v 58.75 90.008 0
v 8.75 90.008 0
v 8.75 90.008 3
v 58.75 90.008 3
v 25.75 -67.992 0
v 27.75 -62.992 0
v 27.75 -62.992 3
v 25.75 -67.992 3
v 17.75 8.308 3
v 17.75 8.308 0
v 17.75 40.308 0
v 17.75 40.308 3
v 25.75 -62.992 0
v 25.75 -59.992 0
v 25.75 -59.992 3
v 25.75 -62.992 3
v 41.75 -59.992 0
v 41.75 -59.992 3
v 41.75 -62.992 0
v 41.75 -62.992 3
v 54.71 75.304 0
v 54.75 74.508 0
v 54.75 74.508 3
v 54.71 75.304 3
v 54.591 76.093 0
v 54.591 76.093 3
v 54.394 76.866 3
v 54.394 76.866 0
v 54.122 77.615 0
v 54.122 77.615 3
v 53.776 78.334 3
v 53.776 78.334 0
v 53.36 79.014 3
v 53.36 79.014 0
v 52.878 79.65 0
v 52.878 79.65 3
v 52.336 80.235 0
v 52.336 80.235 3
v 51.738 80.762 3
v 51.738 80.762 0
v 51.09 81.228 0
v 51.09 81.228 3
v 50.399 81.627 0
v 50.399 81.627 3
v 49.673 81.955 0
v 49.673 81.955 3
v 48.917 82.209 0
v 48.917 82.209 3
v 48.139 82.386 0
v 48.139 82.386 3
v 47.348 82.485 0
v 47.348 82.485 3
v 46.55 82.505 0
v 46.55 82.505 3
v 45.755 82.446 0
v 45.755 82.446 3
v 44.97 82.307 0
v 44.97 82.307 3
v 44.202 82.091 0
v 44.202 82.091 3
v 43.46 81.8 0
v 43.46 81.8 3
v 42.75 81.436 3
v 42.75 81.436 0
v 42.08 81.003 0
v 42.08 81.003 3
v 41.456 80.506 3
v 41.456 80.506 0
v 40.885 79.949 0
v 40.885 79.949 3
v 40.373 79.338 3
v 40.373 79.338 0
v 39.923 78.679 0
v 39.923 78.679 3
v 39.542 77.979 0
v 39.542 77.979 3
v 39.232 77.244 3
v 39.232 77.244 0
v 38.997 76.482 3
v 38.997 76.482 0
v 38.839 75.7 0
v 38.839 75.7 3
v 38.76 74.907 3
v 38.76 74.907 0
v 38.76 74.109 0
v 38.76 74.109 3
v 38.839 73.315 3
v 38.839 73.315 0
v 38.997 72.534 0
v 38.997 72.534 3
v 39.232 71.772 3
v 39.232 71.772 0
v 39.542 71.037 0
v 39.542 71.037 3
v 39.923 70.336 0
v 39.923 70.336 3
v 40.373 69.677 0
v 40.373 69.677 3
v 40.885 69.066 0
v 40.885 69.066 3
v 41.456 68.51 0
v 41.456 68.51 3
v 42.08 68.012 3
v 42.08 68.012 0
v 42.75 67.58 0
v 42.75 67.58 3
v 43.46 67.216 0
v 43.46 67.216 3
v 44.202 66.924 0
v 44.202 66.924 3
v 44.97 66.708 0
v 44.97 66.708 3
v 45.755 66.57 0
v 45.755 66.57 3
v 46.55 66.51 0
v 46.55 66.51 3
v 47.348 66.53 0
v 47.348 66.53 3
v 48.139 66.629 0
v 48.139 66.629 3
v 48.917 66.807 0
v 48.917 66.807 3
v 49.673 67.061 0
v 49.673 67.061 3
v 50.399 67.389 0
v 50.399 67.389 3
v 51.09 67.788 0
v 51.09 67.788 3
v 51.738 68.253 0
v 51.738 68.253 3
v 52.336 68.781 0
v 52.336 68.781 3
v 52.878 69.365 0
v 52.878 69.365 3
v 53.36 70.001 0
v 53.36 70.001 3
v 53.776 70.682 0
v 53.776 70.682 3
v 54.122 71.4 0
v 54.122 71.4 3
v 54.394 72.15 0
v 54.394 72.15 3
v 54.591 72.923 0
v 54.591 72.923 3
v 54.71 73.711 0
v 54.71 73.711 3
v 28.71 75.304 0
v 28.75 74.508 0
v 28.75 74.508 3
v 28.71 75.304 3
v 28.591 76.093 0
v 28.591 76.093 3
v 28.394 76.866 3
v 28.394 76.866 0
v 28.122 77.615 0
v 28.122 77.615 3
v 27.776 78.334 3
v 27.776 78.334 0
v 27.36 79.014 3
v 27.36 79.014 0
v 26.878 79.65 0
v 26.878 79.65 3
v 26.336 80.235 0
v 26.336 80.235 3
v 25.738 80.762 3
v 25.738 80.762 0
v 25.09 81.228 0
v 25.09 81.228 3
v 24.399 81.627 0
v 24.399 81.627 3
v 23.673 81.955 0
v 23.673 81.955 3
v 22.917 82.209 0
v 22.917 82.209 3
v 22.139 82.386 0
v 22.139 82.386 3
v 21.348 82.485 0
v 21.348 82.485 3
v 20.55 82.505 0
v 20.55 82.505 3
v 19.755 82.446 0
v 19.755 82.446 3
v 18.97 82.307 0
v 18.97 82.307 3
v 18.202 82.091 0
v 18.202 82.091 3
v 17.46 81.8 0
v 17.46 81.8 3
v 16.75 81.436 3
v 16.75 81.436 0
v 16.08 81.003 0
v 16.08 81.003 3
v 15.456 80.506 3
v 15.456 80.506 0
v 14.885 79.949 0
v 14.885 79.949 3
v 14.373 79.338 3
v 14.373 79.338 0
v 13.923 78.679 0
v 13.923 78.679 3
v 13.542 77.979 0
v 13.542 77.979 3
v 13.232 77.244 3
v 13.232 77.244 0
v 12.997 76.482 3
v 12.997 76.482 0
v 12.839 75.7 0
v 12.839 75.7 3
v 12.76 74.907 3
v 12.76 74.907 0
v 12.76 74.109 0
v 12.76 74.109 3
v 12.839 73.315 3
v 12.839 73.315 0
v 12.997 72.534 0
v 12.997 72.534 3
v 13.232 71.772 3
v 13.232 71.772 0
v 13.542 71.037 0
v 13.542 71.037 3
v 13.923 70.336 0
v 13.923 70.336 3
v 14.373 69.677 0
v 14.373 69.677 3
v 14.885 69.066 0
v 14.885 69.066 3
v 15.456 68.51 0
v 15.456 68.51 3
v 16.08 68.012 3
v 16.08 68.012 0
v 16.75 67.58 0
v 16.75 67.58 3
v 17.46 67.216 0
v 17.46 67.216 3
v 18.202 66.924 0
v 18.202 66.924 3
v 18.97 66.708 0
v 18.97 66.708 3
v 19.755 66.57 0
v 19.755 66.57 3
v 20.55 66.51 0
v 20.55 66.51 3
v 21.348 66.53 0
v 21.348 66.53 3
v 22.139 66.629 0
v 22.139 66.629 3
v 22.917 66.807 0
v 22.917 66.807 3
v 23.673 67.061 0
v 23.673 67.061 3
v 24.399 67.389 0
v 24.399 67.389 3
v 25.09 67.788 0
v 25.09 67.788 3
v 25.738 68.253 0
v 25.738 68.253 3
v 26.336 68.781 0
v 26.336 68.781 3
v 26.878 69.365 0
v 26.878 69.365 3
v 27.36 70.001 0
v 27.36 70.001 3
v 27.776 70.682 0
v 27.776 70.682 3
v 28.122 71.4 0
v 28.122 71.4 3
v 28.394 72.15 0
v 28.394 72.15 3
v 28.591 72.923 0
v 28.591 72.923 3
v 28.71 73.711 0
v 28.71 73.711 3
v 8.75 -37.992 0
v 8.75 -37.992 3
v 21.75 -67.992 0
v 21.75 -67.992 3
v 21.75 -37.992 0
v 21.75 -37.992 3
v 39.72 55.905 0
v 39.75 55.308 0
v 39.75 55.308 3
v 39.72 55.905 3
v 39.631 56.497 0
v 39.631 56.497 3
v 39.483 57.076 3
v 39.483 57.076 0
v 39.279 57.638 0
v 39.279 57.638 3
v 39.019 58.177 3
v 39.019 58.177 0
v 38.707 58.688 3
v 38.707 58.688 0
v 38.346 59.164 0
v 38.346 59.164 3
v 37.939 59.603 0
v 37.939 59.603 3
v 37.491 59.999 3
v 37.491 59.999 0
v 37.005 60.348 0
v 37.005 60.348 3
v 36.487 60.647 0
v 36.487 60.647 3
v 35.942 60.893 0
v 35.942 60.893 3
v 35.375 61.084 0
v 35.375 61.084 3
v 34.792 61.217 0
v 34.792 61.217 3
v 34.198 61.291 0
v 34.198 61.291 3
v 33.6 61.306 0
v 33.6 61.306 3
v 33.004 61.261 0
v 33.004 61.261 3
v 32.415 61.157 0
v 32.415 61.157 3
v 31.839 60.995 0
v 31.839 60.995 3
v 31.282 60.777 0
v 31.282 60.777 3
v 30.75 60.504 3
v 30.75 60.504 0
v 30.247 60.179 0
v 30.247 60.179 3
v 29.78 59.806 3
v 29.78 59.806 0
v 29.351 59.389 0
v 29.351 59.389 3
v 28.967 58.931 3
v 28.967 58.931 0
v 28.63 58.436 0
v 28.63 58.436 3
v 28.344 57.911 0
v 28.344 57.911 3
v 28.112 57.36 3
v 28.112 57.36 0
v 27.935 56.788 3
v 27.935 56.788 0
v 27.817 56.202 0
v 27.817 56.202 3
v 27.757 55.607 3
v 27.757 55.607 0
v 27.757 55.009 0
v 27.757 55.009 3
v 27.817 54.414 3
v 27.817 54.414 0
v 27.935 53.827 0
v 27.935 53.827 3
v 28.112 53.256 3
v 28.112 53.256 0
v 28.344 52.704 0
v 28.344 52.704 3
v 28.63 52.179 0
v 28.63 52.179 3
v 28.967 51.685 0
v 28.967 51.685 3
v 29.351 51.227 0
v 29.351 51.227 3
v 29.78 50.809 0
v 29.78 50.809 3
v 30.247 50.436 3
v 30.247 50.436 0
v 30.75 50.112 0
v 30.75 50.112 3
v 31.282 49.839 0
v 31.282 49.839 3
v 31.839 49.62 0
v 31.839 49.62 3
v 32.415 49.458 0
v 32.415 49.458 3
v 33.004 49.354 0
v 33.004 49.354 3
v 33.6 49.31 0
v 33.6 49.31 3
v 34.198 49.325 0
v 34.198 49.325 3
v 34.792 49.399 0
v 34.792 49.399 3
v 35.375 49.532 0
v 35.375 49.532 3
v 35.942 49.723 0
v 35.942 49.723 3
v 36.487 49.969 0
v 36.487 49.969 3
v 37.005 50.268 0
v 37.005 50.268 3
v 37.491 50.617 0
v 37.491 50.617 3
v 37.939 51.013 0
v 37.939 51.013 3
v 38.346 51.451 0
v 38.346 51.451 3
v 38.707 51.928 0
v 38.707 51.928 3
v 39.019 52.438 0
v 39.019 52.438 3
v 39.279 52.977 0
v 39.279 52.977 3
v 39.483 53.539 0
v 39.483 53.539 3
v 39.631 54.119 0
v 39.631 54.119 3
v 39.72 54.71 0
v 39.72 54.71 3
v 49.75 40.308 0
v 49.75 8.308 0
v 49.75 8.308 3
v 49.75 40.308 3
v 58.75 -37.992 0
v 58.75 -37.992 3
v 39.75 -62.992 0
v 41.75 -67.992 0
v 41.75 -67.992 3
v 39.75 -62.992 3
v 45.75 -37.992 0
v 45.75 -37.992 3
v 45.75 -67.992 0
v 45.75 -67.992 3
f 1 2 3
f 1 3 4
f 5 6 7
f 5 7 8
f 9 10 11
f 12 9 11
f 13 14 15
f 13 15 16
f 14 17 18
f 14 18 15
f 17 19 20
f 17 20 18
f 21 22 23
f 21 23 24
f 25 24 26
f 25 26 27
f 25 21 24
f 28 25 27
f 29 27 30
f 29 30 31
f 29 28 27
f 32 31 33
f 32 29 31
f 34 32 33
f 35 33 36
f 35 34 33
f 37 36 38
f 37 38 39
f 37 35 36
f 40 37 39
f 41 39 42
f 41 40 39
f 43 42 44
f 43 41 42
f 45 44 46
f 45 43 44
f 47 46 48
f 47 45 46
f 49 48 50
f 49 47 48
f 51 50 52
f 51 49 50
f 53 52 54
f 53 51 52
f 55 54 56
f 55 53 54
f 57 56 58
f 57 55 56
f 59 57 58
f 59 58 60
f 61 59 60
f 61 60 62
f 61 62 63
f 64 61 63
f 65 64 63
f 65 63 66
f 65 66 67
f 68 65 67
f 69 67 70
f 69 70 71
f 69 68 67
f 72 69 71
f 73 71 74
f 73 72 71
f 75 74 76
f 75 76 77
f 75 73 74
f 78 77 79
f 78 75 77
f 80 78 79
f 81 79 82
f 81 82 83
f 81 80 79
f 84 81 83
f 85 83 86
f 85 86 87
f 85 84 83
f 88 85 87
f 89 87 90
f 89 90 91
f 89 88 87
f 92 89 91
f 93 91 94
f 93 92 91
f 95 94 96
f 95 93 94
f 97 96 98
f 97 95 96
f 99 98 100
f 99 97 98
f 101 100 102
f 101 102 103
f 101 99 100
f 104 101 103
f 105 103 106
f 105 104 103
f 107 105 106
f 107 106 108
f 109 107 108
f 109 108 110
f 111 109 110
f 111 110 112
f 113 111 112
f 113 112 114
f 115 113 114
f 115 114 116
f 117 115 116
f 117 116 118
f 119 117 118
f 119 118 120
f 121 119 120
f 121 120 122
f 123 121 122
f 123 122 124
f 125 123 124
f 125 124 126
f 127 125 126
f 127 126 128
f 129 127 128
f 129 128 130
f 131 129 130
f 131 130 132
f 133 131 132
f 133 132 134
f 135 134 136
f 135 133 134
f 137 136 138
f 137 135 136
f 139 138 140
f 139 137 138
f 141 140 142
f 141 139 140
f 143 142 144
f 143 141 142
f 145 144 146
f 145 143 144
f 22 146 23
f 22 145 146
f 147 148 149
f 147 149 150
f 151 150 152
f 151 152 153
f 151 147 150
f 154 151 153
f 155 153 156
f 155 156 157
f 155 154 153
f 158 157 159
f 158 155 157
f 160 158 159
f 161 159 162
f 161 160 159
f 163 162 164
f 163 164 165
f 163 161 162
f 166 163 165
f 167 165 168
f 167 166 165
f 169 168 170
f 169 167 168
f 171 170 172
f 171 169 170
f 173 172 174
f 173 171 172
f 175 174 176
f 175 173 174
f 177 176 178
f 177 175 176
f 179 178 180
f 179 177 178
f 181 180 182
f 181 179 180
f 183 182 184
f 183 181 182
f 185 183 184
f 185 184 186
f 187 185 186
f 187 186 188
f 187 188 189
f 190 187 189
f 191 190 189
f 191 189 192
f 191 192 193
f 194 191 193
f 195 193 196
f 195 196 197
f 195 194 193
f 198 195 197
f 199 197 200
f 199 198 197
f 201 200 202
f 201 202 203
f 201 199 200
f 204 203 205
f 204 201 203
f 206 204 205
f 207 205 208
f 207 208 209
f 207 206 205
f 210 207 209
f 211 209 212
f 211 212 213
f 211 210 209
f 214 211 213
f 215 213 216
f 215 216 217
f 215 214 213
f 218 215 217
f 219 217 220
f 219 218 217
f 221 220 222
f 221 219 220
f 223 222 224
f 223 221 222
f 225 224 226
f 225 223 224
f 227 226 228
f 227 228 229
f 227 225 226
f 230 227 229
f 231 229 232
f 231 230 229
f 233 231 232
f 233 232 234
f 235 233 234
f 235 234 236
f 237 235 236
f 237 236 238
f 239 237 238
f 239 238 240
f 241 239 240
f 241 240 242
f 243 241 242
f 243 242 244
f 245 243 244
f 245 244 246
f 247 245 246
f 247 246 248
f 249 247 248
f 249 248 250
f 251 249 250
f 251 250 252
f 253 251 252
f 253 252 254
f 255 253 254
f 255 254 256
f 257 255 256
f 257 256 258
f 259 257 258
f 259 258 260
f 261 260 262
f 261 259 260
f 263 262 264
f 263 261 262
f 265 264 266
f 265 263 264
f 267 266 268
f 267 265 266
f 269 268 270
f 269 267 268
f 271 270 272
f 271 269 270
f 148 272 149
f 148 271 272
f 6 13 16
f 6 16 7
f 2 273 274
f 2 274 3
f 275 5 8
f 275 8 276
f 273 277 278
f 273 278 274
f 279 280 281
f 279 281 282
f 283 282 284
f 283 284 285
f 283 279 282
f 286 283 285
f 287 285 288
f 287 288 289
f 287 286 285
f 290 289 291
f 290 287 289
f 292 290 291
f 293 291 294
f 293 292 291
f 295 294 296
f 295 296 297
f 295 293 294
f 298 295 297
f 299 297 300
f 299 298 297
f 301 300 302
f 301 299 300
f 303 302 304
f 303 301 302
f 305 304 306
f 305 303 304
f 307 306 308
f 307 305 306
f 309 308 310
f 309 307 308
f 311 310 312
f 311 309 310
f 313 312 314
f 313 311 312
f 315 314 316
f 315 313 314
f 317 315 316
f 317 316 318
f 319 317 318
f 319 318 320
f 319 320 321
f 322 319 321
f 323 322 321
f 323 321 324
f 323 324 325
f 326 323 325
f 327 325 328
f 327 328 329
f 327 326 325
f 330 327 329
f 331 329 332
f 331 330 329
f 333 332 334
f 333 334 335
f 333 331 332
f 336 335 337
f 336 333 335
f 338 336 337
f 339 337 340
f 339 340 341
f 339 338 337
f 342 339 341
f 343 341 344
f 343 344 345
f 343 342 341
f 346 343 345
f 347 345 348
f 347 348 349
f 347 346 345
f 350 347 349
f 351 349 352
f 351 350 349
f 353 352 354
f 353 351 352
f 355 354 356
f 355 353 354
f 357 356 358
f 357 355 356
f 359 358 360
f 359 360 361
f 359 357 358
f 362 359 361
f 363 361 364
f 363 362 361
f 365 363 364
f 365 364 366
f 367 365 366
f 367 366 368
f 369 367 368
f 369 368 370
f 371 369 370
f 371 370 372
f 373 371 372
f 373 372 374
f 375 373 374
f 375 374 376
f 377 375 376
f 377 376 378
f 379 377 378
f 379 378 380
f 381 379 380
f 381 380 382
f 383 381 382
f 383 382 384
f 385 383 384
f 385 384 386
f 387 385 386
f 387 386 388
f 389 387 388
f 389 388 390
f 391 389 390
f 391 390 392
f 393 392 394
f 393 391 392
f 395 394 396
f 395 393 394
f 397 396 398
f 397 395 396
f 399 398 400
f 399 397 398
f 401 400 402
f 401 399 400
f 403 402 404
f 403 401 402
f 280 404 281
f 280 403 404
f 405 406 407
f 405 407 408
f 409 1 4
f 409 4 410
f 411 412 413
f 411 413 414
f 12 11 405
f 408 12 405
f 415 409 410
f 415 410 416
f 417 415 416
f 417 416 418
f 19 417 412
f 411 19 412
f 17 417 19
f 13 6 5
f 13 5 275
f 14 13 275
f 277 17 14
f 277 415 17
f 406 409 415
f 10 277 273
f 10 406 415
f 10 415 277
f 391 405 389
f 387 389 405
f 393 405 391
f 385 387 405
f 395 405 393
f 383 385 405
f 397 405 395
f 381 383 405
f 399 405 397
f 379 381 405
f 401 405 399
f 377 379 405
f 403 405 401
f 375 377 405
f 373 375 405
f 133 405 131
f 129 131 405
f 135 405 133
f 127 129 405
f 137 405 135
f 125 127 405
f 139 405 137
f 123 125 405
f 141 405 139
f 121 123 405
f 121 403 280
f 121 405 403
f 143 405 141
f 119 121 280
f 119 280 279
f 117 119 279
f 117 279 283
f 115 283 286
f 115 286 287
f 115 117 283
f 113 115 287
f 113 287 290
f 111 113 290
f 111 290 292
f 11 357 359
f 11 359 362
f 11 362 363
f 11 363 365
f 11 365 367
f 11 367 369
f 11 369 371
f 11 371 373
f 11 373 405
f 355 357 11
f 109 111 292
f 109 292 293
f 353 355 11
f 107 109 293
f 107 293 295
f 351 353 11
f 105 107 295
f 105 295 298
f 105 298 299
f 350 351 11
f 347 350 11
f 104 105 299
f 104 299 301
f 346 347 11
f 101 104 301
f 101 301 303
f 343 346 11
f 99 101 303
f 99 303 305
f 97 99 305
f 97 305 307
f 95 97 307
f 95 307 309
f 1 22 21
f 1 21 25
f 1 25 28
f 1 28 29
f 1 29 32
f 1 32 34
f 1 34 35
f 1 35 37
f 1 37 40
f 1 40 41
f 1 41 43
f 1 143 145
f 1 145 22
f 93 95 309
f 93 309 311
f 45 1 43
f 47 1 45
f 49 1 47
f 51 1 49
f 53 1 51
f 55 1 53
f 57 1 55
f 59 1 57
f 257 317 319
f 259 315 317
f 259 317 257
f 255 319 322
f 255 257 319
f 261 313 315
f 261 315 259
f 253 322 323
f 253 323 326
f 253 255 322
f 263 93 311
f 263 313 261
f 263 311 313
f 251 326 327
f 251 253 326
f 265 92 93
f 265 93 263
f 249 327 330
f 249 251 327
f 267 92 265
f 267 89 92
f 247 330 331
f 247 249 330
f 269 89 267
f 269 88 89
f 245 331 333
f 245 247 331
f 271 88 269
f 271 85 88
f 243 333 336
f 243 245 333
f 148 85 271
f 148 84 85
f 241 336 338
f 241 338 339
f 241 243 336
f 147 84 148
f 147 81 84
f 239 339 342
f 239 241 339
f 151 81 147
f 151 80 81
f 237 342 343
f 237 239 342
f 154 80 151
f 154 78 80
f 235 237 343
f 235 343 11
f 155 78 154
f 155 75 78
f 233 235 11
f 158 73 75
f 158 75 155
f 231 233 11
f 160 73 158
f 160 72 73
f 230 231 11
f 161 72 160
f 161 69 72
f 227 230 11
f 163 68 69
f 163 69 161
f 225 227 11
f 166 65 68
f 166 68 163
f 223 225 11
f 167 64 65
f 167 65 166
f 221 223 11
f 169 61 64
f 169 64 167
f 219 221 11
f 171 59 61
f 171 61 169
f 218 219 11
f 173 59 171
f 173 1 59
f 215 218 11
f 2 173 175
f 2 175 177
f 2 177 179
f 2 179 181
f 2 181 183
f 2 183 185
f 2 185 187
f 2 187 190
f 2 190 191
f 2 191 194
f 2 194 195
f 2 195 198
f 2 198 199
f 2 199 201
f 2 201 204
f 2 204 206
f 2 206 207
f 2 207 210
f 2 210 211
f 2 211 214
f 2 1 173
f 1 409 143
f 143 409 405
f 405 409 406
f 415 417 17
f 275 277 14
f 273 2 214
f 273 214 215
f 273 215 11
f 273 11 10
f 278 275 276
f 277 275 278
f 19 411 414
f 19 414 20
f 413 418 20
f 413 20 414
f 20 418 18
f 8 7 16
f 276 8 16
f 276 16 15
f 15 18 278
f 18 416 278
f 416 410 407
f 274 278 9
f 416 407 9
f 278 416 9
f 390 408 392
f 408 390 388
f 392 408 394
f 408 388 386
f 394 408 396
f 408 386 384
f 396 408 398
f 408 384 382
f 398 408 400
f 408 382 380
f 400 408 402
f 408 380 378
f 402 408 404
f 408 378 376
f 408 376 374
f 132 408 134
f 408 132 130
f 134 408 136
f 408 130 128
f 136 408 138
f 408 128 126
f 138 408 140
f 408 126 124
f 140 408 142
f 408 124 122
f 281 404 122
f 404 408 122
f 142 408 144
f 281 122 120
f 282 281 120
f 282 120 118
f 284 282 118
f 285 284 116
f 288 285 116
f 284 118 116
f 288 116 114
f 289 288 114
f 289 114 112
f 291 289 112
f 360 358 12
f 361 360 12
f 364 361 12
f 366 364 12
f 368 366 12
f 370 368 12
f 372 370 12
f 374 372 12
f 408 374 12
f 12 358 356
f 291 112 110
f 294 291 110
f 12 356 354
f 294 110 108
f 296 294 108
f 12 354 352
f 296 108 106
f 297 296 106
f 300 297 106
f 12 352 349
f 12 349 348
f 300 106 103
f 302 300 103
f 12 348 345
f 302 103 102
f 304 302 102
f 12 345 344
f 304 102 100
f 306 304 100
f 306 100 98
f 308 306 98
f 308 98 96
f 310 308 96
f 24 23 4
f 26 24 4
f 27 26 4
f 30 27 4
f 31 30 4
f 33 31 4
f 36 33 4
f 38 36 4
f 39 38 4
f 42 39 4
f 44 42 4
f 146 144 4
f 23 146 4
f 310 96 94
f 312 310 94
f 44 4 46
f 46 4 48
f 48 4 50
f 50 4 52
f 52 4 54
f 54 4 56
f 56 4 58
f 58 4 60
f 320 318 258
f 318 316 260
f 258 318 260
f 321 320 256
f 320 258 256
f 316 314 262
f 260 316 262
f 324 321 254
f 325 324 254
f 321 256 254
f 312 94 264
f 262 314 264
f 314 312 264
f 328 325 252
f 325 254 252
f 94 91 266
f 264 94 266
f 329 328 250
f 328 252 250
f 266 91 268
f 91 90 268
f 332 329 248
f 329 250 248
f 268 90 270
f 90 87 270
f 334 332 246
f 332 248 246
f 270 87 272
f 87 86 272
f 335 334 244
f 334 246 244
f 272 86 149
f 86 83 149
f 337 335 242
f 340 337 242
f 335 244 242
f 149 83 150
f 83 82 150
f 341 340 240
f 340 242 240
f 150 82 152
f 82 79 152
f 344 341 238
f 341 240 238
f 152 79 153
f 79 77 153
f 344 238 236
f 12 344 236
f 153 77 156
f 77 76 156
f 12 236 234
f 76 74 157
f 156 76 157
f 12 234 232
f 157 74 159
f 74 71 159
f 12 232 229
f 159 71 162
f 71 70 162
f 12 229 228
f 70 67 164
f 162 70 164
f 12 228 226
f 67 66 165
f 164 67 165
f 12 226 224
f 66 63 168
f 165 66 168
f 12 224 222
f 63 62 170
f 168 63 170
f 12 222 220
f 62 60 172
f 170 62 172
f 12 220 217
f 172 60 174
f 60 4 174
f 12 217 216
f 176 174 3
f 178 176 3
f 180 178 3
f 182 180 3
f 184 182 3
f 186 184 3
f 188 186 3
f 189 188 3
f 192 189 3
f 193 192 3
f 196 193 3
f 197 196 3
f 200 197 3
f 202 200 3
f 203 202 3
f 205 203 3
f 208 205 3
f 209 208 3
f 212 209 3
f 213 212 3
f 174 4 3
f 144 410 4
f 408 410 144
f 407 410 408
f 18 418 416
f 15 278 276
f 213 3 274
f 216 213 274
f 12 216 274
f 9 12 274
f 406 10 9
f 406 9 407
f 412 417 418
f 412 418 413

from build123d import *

# Parameters (mm, degrees)
MODEL_R                 = 6
MODEL_R_2               = 8
MODEL_W                 = 32
MODEL_H                 = 32
SALIENTE_EXTRUIR1_DEPTH = 3


with BuildPart() as part:
    # Model → Saliente-Extruir1 (new body)
    with BuildSketch(Plane.XY):
        Polygon((58.7498, 90.00776192), (58.7498, -37.99223808), (45.7498, -37.99223808), (45.7498, -67.99223808), (41.7498, -67.99223808), (39.7498, -62.99223808), (41.7498, -62.99223808), (41.7498, -59.99223808), (25.7498, -59.99223808), (25.7498, -62.99223808), (27.7498, -62.99223808), (25.7498, -67.99223808), (21.7498, -67.99223808), (21.7498, -37.99223808), (8.7498, -37.99223808), (8.7498, 90.00776192), align=None)
        with Locations((33.7498, 55.30776192)):
            Circle(MODEL_R, mode=Mode.SUBTRACT)
        with Locations((20.7498, 74.50776192)):
            Circle(MODEL_R_2, mode=Mode.SUBTRACT)
        with Locations((46.7498, 74.50776192)):
            Circle(MODEL_R_2, mode=Mode.SUBTRACT)
        with Locations((33.7498, 24.30776192)):
            Rectangle(MODEL_W, MODEL_H, mode=Mode.SUBTRACT)
    extrude(amount=SALIENTE_EXTRUIR1_DEPTH)


solid = part.part
